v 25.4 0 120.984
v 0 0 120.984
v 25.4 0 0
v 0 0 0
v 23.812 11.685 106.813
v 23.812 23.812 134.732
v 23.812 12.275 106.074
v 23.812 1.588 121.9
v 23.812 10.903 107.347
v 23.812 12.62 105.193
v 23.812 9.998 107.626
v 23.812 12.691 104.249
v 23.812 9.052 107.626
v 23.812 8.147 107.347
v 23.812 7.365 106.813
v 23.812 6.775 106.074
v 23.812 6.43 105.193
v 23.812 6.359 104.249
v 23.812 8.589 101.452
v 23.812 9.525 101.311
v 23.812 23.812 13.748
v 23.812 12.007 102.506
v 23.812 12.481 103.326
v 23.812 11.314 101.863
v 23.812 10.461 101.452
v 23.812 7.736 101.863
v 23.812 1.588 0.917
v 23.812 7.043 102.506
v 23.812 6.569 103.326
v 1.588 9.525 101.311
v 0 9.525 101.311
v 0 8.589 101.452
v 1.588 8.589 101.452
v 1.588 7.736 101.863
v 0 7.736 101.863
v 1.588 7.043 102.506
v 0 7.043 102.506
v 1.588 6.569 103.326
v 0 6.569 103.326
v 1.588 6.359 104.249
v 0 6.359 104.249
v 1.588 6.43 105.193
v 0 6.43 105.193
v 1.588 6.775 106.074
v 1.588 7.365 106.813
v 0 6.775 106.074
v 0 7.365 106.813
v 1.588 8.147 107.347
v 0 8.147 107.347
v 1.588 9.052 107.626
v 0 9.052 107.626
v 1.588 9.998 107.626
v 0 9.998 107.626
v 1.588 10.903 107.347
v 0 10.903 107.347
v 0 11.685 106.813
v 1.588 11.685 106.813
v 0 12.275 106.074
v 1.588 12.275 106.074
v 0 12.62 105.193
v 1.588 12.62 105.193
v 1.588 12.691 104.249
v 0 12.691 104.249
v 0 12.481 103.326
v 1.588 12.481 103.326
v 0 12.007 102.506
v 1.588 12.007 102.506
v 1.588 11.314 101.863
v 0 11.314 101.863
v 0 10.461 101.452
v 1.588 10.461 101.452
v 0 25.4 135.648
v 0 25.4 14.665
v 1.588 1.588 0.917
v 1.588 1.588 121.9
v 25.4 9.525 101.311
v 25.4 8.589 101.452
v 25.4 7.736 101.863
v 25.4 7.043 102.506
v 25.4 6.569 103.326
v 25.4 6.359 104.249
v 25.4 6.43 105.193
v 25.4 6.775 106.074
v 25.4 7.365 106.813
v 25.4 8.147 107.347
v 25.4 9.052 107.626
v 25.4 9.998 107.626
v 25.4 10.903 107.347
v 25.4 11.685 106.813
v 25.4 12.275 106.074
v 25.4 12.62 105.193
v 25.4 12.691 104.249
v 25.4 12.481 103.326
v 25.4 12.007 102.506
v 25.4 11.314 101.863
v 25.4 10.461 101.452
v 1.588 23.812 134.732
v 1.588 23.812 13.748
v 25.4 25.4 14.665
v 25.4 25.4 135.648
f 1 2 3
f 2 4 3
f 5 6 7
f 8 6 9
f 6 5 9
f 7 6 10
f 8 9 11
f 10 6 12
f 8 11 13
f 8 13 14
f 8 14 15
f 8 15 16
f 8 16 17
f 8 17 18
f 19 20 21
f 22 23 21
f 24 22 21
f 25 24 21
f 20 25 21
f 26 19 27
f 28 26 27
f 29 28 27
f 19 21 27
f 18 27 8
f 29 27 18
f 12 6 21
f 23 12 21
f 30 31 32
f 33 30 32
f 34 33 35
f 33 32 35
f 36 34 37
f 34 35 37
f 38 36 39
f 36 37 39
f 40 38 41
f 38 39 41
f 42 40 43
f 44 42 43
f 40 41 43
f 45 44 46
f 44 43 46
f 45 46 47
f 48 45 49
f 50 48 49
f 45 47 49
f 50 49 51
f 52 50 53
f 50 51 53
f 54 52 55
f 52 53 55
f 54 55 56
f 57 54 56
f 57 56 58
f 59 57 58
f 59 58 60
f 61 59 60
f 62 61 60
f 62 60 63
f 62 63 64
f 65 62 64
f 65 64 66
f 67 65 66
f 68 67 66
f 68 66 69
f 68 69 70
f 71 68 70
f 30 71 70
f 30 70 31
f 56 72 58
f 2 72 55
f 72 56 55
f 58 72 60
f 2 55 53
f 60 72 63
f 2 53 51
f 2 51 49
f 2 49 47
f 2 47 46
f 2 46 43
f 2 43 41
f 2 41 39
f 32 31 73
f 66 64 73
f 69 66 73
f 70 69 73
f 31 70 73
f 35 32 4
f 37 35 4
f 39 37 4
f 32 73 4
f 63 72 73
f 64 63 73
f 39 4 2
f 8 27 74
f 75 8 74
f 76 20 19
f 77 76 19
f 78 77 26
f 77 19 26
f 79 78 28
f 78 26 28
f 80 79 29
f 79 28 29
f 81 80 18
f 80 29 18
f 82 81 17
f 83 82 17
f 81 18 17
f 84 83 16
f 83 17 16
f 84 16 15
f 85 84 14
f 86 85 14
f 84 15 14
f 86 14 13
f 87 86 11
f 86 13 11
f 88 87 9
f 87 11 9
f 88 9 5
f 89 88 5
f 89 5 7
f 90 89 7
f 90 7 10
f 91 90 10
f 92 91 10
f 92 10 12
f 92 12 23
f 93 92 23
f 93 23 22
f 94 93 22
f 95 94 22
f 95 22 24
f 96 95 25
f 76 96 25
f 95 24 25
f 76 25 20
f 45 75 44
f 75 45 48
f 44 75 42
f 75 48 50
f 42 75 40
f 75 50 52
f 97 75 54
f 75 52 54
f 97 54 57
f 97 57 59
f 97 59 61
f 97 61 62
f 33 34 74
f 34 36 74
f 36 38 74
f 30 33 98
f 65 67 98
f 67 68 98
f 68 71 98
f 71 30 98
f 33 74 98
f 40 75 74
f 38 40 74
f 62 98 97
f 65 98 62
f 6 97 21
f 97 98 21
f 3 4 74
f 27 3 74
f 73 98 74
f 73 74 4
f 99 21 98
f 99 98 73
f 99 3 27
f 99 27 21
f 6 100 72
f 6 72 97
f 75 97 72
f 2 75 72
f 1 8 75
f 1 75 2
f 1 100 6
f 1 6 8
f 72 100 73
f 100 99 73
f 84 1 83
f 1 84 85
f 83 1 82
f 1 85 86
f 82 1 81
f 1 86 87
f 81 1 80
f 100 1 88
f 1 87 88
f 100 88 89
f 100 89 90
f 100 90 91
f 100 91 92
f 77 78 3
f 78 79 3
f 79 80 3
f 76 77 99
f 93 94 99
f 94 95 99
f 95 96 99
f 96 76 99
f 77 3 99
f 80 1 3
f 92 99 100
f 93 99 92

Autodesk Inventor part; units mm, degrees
ref_plane "YZ Plane" through (0, 0, 0) normal (1, 0, 0) x (0, 1, 0)
ref_plane "XZ Plane" through (0, 0, 0) normal (0, 1, 0) x (-1, 0, 0)
ref_plane "XY Plane" through (0, 0, 0) normal (0, 0, 1) x (1, 0, 0)
sketch "Sketch1" plane through (0, 0, 0) normal (0, 0, 1) x (1, 0, 0)
  line L0 (0, 0) -> (25.4, 0)
  line L1 (25.4, 0) -> (25.4, 25.4)
  line L2 (25.4, 25.4) -> (0, 25.4)
  line L3 (0, 25.4) -> (0, 0)
  line L4 (1.5875, 23.8125) -> (23.8125, 23.8125)
  line L5 (23.8125, 23.8125) -> (23.8125, 1.5875)
  line L6 (23.8125, 1.5875) -> (1.5875, 1.5875)
  line L7 (1.5875, 1.5875) -> (1.5875, 23.8125)
  dimension "d0" = 25.4
  dimension "d1" = 25.4
  dimension "d2" = 1.5875
extrude "Extrusion1" add sketch "Sketch1" along normal blind 203.2
sketch "Sketch3" plane through (25.4, 0, 0) normal (1, 0, 0) x (0, 0, -1)
  line L0 (0, 0) -> (-203.2, 0) projected
  line L1 (0, 0) -> (-14.6647, 25.4)
  line L2 (-14.6647, 25.4) -> (0, 25.4)
  line L3 (0, 23.8125) -> (-203.2, 23.8125) projected
  line L4 (0, 0) -> (0, 25.4) projected
  line L5 (0, 25.4) -> (0, 0)
  line L6 (0, 25.4) -> (-203.2, 25.4) projected
  line L7 (-192.6047, 25.4) -> (-177.94, 0)
  line L8 (0, 25.4) -> (-203.2, 25.4) projected
  line L9 (-192.6047, 25.4) -> (-203.2, 25.4)
  line L10 (-203.2, 25.4) -> (-203.2, 0)
  line L11 (-177.94, 0) -> (-203.2, 0)
  dimension "d8" = 30
  dimension "d11" = 177.94
extrude "Extrusion3" cut sketch "Sketch3" against normal blind 25.4 contours L1 L3 L4 | L1 L2 L4 L3
sketch "Sketch4" plane through (25.4, 0, 203.2) normal (1, 0, 0) x (0, 0, -1)
  line L0 (14.0789, 25.4) -> (28.7436, 0)
  line L1 (28.7436, 0) -> (0, 0)
  line L2 (189.4518, 23.8125) -> (0, 23.8125) projected
  line L3 (0, 0) -> (0, 25.4)
  line L4 (0, 25.4) -> (14.0789, 25.4)
  line L5 (188.5353, 25.4) -> (0, 25.4) projected
  line L6 (203.2, 0) -> (188.5353, 25.4) projected
  dimension "d12" = 174.4564
  dimension "d13" = 25.4
  dimension "d14" = 28.7436
extrude "Extrusion4" cut sketch "Sketch4" against normal blind 25.4 contours L0 L2 L3 L4 | L0 L1 L3 L2
sketch "Sketch5" plane through (25.4, 0, 174.4564) normal (1, 0, 0) x (0, 0, -1)
  line L0 (173.5398, 1.5875) -> (-0.9165, 1.5875) projected
  line L1 (173.5398, 1.5875) -> (82.802, -50.8)
  line L2 (174.4564, 0) -> (159.7917, 25.4) projected
  line L3 (82.802, -50.8) -> (32.002, 37.1882)
  line L4 (159.7917, 25.4) -> (-14.6647, 25.4) projected
  line L5 (38.8079, 25.4) -> (-14.6647, 25.4)
  line L6 (-14.6647, 25.4) -> (0, 0)
  line L7 (0, 0) -> (53.4726, 0)
  line L8 (-14.6647, 25.4) -> (0, 0) projected
  line L9 (174.4564, 0) -> (0, 0) projected
  dimension "d17" = 90
  dimension "d18" = 104.775
  dimension "d20" = 101.6
sketch "Sketch6" plane through (25.4, 0, 174.4564) normal (1, 0, 0) x (0, 0, -1)
  line L0 (159.7917, 25.4) -> (-14.6647, 25.4) projected
  line L1 (38.8079, 25.4) -> (53.4726, 0)
  line L2 (53.4726, 0) -> (0, 0)
  line L3 (173.5398, 1.5875) -> (-0.9165, 1.5875) projected
  line L4 (0, 0) -> (-14.6647, 25.4) projected
  line L5 (0, 0) -> (-14.6647, 25.4)
  line L6 (-14.6647, 25.4) -> (38.8079, 25.4)
  line L7 (160.7082, 23.8125) -> (-13.7482, 23.8125) projected
  line L8 (174.4564, 0) -> (0, 0) projected
  line L9 (82.802, -50.8) -> (32.002, 37.1882) projected
extrude "Extrusion5" cut sketch "Sketch6" against normal blind 25.4
sketch "Sketch7" plane through (25.4, 0, 120.9837) normal (1, 0, 0) x (0, 0, -1)
  line L0 (106.3191, 25.4) -> (-14.6647, 25.4) projected
  line L1 (-14.6647, 25.4) -> (29.3294, 50.8)
  line L2 (-14.6647, 25.4) -> (0, 0) projected
  line L3 (16.4978, 9.525) -> (16.4978, 9.525)
  line L4 (16.4978, 9.525) -> (0, 0)
  point P0 (120.9837, 0)
  dimension "d23" = 50.8
  dimension "d25" = 19.05
  dimension "d27" = 0
hole "Hole1" at (25.4, 9.525, 104.486) direction (-1, 0, 0) diameter 6.35 end through all
properties part number "SUP_022_NEWClimberSupport" material "Aluminum 6061"
